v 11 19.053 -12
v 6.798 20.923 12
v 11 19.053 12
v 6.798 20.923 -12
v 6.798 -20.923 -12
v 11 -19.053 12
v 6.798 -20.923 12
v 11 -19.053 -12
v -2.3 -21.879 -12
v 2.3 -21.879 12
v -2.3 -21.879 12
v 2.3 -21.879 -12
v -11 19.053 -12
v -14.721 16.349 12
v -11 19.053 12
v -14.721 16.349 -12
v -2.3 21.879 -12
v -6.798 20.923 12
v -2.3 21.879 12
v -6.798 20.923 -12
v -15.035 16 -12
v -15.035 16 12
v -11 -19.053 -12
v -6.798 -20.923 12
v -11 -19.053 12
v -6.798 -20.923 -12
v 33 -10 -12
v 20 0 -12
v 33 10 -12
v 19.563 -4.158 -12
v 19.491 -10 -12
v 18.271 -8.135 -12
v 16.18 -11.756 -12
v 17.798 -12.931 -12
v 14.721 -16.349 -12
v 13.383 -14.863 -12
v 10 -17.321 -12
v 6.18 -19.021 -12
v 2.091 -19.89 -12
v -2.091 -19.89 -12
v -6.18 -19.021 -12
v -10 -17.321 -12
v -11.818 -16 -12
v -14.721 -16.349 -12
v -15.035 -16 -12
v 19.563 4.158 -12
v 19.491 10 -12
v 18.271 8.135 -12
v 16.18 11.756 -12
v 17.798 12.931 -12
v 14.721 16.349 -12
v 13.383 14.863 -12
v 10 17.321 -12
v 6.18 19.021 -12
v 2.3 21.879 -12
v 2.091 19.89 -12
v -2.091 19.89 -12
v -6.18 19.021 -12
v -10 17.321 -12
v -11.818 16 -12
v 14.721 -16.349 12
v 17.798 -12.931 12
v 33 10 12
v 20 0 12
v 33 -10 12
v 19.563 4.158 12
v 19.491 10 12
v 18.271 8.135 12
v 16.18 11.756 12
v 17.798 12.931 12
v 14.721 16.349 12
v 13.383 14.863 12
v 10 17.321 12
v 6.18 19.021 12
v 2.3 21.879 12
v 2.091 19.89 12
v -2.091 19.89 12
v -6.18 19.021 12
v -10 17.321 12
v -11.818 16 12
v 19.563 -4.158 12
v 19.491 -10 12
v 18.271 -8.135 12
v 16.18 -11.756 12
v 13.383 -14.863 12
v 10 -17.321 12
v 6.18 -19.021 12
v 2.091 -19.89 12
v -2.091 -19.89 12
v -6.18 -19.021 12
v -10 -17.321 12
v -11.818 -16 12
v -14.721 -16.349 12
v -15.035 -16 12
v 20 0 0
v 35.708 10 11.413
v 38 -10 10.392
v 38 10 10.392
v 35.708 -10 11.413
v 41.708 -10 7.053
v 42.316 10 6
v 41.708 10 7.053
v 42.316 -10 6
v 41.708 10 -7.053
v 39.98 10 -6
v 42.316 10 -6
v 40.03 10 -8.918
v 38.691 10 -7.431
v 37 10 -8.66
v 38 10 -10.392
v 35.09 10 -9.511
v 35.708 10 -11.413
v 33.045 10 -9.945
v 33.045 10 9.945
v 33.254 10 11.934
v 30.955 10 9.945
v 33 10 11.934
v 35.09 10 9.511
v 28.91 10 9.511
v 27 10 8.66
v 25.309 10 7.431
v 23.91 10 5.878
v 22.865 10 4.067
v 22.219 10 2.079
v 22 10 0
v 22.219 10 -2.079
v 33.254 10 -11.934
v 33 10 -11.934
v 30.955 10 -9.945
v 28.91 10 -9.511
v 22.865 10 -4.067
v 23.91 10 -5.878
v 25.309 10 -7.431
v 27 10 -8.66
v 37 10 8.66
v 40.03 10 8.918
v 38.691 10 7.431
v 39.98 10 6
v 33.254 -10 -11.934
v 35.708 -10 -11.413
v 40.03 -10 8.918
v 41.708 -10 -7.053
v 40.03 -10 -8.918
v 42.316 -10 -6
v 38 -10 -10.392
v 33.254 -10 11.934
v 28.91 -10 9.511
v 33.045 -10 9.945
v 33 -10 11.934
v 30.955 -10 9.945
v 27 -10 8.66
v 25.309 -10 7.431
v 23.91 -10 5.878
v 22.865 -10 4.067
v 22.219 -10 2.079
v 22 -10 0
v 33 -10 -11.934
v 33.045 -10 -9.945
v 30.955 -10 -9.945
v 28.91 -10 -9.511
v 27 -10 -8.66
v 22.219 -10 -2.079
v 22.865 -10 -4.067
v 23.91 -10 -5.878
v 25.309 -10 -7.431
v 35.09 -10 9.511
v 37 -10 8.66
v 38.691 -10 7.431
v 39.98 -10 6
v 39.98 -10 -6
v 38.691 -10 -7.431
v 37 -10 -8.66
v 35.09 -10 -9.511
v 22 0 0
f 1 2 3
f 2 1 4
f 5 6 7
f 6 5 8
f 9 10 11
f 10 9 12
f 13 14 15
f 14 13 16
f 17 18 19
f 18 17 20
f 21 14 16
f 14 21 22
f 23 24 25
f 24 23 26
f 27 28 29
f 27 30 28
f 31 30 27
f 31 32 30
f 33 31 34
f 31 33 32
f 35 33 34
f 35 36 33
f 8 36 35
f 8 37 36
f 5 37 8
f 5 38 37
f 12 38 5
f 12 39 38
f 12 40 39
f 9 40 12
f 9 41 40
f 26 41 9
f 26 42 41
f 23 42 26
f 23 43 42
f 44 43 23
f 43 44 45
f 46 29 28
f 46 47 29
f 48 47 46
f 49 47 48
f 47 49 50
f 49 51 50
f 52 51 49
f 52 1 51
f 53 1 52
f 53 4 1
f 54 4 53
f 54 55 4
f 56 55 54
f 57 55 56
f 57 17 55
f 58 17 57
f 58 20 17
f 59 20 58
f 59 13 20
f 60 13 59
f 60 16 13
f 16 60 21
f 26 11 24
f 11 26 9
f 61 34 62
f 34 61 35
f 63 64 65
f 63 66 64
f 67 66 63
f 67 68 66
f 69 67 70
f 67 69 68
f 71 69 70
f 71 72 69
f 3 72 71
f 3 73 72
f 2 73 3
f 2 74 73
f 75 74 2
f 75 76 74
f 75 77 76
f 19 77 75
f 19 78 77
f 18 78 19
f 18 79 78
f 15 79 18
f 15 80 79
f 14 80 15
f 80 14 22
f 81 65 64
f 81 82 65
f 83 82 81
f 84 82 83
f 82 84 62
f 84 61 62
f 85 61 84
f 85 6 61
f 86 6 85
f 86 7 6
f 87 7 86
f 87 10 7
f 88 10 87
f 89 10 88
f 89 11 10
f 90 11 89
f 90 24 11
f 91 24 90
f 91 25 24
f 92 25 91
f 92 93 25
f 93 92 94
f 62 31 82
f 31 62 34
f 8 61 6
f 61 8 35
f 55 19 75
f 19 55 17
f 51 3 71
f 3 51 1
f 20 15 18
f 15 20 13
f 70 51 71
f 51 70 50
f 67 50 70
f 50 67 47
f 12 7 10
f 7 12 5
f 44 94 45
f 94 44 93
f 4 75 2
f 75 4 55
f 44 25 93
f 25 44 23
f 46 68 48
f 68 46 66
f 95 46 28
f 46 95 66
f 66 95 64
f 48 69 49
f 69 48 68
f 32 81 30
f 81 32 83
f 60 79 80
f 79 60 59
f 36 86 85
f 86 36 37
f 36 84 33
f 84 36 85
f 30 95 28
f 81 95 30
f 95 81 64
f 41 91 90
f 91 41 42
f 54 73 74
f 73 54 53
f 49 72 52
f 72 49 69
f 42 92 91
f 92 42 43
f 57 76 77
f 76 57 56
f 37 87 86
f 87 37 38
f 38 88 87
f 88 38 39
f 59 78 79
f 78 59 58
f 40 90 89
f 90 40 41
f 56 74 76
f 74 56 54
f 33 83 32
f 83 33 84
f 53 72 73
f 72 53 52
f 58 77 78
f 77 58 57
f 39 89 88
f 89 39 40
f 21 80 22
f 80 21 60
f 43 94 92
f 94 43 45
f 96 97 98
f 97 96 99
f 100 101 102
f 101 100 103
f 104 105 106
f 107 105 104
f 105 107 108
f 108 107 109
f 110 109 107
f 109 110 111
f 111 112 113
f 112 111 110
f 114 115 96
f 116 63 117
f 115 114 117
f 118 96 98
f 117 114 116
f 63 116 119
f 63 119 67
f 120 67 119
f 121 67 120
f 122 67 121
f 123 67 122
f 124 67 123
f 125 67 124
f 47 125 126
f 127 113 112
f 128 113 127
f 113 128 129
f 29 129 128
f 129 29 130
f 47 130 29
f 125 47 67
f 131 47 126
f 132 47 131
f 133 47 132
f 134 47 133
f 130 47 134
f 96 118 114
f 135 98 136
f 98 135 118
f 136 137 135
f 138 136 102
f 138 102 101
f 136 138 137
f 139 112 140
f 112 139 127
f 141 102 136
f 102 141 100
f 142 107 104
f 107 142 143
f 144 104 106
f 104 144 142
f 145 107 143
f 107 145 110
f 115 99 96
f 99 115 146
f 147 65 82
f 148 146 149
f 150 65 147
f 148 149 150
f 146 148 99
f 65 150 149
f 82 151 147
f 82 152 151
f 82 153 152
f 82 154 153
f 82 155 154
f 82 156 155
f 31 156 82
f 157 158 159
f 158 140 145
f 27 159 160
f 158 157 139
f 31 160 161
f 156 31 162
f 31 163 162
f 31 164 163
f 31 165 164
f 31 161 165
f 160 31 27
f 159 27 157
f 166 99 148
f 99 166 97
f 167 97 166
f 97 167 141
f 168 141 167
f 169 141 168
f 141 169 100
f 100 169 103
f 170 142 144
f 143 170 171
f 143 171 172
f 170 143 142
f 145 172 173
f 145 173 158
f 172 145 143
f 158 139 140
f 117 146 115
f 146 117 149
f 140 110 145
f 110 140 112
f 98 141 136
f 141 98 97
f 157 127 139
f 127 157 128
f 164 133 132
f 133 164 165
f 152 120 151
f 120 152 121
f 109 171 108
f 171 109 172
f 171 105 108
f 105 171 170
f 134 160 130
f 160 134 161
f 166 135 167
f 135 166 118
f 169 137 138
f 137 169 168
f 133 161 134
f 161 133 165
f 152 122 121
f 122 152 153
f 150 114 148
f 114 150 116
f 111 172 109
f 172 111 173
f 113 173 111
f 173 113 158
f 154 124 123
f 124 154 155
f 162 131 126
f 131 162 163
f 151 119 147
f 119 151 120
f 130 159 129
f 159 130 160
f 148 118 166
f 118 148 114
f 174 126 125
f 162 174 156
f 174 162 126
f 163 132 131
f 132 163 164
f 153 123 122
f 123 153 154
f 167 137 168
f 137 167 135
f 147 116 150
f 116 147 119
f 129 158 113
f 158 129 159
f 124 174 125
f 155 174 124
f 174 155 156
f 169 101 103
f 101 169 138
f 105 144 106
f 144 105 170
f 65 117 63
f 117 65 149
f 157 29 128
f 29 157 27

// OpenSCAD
d1=40;
d2=20;
w=2; //wall
x=8;

D1=d1/2;
D2=d2/2;

union(){
difference(){
cylinder(d2+w+w,D1+w,D1+w,center=true);
cylinder(d2+w+w+1,D1,D1,center=true);
    translate([-D2-w,0,0])
    cube([d1-x,d1-x,d1+w+w],center=true);
}
translate([D2+D1+w,0,0])
rotate(a=90,v=[1,0,0])
difference(){
cylinder(20,D2+w,D2+w,center=true);
cylinder(21,D2,D2,center=true);
    translate([D2,0,0])
    cube([d2-x,d2-x,21],center=true);
}
difference(){
translate([D1-w,0,0])
cube([(d1+d2)/2,20,d2+w+w],center=true);
    translate([D2+D1+w,0,0])
rotate(a=90,v=[1,0,0])
    cylinder(21,D2,D2,center=true);
    cylinder(d2+w+w+1,D1,D1,center=true);
}
}
